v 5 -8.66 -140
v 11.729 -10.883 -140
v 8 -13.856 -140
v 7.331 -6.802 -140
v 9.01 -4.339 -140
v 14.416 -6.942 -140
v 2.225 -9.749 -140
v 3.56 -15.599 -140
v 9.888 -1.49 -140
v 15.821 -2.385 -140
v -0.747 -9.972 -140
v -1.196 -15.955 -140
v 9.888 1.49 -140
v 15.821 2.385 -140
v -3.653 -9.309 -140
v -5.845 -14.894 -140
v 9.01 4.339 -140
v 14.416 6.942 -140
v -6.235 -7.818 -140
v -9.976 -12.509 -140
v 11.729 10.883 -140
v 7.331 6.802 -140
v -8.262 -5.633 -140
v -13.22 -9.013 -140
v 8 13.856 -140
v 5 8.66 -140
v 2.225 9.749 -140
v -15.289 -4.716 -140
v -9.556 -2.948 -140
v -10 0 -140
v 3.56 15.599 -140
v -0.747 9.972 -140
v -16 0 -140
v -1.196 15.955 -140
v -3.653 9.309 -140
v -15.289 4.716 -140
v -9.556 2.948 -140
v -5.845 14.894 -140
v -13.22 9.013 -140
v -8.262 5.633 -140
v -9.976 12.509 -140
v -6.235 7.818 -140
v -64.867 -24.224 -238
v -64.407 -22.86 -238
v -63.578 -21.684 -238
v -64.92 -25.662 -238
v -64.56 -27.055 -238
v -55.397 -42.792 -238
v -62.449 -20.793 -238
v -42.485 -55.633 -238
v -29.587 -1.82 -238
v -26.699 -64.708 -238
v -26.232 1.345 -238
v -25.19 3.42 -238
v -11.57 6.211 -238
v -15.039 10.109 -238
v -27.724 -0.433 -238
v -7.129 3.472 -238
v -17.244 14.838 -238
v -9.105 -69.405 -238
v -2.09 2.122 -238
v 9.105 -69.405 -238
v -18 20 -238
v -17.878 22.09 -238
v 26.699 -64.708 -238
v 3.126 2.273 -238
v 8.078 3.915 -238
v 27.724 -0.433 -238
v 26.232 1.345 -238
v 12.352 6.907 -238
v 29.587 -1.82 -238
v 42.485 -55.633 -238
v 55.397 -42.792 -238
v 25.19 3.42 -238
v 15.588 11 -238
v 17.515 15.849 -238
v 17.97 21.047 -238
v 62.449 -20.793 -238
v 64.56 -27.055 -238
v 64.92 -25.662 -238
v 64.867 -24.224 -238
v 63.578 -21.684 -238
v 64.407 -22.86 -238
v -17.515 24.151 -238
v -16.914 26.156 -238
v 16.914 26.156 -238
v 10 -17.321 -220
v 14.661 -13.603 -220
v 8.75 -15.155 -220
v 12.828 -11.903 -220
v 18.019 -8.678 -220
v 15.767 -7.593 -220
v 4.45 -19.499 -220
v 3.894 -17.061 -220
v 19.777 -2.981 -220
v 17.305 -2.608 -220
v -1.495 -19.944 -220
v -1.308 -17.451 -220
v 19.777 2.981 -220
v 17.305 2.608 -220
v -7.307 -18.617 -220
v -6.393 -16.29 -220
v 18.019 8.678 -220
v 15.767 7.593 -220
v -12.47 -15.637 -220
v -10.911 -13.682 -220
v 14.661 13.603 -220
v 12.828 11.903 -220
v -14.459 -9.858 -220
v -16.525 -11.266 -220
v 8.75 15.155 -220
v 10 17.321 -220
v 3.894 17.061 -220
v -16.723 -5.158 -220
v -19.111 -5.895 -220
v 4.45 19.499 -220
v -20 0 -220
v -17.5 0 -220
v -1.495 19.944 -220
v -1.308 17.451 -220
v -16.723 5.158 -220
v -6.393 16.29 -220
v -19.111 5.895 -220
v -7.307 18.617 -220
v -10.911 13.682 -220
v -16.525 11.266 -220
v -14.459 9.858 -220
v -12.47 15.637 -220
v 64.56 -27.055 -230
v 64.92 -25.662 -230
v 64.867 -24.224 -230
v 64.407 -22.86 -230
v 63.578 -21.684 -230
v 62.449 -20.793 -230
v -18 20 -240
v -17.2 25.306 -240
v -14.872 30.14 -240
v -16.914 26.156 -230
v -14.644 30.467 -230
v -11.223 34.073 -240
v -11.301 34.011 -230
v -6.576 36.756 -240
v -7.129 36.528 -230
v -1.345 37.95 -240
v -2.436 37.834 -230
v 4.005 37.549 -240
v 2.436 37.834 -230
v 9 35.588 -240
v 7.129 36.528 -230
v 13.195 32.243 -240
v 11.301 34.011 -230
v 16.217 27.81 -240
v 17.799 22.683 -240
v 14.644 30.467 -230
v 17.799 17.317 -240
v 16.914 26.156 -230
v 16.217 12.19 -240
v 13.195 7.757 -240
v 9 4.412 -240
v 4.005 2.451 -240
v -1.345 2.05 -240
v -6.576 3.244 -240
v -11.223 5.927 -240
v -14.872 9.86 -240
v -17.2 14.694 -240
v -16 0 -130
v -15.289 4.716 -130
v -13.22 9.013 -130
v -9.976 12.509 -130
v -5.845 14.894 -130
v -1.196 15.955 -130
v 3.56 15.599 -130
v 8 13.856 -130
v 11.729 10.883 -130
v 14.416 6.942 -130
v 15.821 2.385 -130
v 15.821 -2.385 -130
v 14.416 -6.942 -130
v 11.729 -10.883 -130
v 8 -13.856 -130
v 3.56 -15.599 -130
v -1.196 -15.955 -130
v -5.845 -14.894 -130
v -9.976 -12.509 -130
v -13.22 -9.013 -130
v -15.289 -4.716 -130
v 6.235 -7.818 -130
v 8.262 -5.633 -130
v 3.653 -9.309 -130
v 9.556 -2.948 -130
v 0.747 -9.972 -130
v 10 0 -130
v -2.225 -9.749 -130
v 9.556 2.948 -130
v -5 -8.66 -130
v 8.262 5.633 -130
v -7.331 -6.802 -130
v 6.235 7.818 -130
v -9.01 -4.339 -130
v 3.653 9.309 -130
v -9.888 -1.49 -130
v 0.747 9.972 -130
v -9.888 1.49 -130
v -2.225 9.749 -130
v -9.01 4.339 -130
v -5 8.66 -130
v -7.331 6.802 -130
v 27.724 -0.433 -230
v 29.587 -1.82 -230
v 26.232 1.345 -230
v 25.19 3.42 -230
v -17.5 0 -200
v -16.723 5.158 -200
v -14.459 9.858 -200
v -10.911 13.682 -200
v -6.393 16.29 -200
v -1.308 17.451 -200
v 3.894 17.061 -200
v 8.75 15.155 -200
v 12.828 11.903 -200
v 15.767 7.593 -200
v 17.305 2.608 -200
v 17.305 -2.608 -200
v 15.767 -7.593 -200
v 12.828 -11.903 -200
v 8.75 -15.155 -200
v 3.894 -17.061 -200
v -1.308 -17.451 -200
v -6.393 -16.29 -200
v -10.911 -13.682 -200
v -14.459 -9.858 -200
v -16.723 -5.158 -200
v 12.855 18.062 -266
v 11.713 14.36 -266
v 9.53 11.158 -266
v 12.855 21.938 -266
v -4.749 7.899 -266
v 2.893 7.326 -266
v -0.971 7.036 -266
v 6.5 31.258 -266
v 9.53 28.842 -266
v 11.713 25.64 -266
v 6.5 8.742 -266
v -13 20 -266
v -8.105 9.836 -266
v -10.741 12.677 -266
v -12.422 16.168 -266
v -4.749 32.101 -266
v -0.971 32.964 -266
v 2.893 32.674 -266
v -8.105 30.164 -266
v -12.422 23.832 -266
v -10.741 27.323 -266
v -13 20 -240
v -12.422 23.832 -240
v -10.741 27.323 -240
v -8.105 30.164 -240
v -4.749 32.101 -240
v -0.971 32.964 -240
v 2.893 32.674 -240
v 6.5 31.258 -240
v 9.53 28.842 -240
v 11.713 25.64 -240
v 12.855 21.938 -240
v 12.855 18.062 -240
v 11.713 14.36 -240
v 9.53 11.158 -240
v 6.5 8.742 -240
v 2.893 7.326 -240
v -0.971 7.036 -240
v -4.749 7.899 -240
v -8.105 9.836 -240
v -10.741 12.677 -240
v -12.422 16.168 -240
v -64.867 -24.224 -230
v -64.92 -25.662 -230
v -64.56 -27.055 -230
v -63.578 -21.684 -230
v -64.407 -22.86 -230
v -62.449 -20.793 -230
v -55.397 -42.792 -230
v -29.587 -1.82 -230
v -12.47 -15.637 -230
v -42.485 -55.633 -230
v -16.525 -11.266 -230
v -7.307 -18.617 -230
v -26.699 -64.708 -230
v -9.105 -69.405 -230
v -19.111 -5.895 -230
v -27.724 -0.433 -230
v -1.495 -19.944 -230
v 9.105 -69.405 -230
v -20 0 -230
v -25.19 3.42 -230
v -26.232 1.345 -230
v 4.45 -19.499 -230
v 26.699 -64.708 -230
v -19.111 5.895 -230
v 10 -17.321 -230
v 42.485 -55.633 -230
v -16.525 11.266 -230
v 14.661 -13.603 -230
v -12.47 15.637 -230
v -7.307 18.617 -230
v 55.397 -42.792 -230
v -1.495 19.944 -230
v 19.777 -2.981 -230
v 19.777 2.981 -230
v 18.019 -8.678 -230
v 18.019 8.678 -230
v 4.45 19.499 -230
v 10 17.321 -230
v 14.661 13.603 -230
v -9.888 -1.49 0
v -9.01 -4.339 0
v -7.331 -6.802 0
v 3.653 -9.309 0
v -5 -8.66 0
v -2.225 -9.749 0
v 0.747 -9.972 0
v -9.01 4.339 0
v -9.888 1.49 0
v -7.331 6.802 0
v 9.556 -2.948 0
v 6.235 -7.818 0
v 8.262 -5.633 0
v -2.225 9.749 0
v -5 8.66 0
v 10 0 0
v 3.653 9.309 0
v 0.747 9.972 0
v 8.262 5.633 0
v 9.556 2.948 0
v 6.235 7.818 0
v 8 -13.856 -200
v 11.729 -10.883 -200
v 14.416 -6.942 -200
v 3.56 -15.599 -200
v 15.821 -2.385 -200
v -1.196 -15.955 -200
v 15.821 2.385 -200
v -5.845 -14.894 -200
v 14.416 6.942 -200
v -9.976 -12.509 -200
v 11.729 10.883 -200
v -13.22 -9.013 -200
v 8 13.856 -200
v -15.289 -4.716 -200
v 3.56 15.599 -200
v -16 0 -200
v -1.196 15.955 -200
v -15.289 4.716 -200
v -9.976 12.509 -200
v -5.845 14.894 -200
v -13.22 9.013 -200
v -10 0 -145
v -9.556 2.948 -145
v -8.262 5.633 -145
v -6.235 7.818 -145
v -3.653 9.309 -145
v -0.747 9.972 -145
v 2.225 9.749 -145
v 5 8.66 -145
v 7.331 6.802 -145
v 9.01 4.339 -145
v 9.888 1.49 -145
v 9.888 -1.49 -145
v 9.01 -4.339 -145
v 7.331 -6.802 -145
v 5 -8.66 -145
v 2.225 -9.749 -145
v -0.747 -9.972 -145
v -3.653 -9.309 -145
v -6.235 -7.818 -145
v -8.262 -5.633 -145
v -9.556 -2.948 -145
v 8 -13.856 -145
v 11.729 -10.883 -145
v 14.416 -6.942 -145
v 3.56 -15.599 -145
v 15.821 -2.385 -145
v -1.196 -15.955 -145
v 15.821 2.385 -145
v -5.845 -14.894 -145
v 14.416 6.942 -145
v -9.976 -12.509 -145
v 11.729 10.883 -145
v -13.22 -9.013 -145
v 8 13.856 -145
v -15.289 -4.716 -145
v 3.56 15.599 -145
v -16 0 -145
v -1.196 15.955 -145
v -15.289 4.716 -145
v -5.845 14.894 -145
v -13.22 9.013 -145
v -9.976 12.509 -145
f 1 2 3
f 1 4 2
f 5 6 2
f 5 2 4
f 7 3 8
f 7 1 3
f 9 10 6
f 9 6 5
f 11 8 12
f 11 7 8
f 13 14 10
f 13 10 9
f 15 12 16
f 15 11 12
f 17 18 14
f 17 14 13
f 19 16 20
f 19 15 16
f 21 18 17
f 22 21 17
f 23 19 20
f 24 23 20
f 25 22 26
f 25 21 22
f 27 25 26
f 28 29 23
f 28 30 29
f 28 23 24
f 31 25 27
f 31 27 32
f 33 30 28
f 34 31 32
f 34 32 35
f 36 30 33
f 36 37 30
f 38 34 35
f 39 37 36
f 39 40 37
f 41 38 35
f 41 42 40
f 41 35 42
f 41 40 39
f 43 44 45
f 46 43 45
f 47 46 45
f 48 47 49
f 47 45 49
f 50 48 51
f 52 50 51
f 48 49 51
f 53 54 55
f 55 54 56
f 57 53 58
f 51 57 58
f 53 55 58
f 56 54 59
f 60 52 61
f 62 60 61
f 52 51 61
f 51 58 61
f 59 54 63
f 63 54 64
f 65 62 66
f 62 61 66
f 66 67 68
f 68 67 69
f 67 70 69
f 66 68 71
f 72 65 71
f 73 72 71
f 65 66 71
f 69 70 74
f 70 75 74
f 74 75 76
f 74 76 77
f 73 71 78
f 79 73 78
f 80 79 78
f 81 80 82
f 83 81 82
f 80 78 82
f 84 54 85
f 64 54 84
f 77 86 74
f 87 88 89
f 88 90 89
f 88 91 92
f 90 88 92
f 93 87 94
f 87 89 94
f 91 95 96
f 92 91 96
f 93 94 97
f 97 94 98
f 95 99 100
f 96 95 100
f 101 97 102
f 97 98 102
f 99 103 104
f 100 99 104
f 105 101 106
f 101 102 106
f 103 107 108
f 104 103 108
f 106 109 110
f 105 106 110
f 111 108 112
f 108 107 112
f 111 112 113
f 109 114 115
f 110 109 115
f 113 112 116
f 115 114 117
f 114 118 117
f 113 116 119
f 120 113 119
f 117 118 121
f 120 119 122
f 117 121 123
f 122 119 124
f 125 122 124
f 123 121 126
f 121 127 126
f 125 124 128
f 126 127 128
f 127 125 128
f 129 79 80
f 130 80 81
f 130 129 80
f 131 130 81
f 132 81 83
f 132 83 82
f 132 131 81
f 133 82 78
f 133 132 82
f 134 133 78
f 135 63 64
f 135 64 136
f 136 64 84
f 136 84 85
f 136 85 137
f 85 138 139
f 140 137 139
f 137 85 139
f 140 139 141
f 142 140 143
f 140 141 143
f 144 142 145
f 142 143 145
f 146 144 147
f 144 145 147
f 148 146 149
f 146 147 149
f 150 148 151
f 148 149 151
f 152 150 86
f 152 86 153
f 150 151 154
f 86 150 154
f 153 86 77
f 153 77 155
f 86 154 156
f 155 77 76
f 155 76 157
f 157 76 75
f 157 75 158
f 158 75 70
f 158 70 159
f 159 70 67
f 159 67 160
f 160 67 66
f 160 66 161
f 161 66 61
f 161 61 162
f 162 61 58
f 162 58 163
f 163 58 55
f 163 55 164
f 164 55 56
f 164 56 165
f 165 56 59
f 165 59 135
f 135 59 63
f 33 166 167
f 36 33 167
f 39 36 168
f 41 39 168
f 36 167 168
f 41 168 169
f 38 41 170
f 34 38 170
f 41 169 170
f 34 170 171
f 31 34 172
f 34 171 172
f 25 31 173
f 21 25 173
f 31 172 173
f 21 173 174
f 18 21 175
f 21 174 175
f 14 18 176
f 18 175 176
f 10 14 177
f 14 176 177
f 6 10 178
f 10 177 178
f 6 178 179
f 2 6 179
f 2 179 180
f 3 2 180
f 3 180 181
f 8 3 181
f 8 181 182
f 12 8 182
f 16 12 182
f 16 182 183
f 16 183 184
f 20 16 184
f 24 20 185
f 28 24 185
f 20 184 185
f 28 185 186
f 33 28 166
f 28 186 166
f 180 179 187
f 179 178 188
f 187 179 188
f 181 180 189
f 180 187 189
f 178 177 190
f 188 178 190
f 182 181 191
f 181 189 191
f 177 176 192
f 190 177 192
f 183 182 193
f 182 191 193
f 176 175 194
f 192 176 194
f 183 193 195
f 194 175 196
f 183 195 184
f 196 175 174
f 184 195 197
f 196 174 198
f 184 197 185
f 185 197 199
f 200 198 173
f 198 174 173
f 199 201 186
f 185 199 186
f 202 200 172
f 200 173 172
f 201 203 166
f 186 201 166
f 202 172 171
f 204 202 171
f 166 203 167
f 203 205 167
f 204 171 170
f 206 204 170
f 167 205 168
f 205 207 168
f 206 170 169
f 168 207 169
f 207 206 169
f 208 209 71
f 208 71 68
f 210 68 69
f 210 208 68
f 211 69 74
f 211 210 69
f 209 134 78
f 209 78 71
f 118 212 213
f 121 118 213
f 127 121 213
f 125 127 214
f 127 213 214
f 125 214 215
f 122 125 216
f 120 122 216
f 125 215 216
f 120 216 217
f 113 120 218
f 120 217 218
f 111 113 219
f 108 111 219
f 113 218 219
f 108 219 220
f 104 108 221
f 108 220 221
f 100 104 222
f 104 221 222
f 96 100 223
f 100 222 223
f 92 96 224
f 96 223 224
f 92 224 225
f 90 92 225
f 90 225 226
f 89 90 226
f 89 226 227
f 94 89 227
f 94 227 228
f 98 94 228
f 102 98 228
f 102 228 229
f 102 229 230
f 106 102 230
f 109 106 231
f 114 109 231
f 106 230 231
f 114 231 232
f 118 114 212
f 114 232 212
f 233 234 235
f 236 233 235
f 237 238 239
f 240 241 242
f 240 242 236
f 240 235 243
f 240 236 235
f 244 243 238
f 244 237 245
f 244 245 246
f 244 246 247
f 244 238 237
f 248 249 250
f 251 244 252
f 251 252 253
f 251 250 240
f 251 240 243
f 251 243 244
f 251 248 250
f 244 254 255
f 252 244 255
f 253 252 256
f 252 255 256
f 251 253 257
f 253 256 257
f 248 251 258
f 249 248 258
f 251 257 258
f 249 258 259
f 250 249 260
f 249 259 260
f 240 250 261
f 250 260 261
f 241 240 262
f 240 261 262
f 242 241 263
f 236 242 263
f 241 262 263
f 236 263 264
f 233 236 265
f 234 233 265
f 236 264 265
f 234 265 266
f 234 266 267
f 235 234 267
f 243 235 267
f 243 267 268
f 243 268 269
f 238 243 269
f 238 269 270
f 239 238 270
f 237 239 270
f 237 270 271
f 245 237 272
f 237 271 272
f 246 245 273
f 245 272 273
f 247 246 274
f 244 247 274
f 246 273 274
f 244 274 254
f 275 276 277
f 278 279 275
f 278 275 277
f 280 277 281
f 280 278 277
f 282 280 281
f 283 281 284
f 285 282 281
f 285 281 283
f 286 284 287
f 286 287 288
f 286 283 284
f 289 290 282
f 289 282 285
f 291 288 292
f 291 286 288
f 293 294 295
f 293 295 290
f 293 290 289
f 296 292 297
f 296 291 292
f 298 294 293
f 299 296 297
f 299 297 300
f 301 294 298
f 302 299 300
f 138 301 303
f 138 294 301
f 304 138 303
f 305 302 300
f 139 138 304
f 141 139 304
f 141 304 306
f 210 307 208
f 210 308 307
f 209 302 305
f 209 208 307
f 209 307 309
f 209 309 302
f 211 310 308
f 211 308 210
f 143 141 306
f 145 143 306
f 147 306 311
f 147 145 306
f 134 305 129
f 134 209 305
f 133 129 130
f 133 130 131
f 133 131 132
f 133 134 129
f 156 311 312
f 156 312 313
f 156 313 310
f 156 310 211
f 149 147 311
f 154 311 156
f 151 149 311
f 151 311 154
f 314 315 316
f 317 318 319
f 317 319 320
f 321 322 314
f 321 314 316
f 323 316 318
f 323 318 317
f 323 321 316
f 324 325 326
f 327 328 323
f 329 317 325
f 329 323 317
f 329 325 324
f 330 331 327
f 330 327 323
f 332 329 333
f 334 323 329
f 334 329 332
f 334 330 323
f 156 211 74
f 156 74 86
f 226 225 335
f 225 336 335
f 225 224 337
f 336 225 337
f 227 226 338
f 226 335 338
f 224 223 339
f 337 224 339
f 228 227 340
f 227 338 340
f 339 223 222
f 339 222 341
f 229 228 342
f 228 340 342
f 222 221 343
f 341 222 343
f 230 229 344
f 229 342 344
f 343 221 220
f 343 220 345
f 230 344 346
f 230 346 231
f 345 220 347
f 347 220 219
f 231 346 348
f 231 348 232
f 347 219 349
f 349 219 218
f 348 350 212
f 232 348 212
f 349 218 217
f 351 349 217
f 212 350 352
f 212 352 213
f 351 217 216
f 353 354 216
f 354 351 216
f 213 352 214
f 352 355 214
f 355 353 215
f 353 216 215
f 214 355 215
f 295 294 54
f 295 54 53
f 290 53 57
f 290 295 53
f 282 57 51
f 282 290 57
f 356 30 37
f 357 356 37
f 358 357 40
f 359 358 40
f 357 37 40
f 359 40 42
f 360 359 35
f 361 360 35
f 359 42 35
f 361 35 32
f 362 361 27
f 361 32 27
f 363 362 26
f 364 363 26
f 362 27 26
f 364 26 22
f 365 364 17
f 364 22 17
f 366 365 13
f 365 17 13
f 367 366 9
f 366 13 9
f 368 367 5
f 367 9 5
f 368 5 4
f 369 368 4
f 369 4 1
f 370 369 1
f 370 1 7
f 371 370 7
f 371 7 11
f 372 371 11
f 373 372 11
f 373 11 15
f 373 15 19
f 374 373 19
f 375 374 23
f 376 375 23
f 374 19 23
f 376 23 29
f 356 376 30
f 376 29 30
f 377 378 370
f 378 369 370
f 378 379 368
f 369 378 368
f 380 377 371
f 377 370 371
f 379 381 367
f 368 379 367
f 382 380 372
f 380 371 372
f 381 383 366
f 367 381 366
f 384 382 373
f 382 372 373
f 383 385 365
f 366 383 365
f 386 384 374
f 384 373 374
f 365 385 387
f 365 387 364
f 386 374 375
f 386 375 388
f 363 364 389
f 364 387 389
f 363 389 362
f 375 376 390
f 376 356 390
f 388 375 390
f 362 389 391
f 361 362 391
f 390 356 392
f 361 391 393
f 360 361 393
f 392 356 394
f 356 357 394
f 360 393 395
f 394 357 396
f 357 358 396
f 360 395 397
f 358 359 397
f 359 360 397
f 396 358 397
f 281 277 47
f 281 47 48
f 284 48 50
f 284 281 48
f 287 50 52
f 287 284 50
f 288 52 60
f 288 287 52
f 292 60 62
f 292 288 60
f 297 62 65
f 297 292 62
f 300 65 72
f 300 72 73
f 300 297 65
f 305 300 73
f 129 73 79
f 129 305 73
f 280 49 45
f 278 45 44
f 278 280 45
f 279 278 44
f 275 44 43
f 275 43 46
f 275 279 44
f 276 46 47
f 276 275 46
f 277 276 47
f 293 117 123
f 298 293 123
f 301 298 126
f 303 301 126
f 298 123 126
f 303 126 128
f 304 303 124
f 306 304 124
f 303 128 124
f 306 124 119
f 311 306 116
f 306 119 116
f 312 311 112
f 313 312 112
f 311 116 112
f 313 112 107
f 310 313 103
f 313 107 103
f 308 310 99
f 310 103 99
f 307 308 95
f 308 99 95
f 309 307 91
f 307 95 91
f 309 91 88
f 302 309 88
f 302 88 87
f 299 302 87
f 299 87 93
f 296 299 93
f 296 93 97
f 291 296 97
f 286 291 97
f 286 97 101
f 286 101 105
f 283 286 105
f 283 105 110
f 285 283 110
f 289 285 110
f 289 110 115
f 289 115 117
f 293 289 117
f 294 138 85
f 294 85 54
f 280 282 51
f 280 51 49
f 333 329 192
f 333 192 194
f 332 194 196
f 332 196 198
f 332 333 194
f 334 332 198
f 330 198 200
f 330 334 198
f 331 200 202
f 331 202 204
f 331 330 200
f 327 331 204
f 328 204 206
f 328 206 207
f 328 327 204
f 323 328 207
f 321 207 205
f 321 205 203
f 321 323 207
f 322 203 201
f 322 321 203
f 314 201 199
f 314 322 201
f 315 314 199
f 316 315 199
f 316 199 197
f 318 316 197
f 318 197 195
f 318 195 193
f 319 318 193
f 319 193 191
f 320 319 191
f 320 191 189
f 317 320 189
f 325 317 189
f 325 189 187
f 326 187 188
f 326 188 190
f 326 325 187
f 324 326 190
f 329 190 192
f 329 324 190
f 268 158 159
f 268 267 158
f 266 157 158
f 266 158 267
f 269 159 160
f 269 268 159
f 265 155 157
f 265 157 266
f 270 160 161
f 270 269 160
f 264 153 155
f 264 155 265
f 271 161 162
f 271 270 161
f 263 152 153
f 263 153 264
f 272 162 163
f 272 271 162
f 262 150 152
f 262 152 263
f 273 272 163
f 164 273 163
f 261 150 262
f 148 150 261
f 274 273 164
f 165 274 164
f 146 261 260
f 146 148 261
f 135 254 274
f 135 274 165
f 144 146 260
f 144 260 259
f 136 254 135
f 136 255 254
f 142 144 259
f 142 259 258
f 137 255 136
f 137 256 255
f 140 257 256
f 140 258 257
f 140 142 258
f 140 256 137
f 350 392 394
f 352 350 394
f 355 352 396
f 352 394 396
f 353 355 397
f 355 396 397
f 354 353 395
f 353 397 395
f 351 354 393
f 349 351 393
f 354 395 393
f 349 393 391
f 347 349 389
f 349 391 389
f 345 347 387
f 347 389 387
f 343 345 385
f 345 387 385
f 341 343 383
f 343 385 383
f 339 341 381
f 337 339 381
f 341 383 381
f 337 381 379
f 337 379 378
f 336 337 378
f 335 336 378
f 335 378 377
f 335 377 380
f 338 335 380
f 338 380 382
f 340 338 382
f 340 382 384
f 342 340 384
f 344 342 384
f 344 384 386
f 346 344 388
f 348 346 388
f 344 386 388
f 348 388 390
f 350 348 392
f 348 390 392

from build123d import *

# Parameters (mm, degrees)
SKETCH1_R            = 10
BOSS_EXTRUDE1_DEPTH  = 130
SKETCH2_R            = 16
BOSS_EXTRUDE2_DEPTH  = 10
SKETCH3_R            = 10
BOSS_EXTRUDE4_DEPTH  = 5
SKETCH6_R            = 16
BOSS_EXTRUDE5_DEPTH  = 55
SKETCH7_R            = 17.5
BOSS_EXTRUDE6_DEPTH  = 20
SKETCH8_R            = 20
BOSS_EXTRUDE7_DEPTH  = 10
SKETCH9_R            = 18
BOSS_EXTRUDE8_DEPTH  = 10
SKETCH10_R           = 13
BOSS_EXTRUDE9_DEPTH  = 26
BOSS_EXTRUDE10_DEPTH = 8


with BuildPart() as part:
    # Sketch1 → Boss-Extrude1 (new body)
    with BuildSketch(Plane.XY):
        Circle(SKETCH1_R)
    extrude(amount=-BOSS_EXTRUDE1_DEPTH)

    # Sketch2 → Boss-Extrude2 (add)
    with BuildSketch(Plane(origin=(0, 0, -130), x_dir=(-1, 0, 0), z_dir=(0, 0, -1))):
        Circle(SKETCH2_R)
    extrude(amount=BOSS_EXTRUDE2_DEPTH)

    # Sketch3 → Boss-Extrude4 (add)
    with BuildSketch(Plane(origin=(0, 0, -140), x_dir=(-1, 0, 0), z_dir=(0, 0, -1))):
        Circle(SKETCH3_R)
    extrude(amount=BOSS_EXTRUDE4_DEPTH)

    # Sketch6 → Boss-Extrude5 (add)
    with BuildSketch(Plane(origin=(0, 0, -145), x_dir=(-1, 0, 0), z_dir=(0, 0, -1))):
        Circle(SKETCH6_R)
    extrude(amount=BOSS_EXTRUDE5_DEPTH)

    # Sketch7 → Boss-Extrude6 (add)
    with BuildSketch(Plane(origin=(0, 0, -200), x_dir=(-1, 0, 0), z_dir=(0, 0, -1))):
        Circle(SKETCH7_R)
    extrude(amount=BOSS_EXTRUDE6_DEPTH)

    # Sketch8 → Boss-Extrude7 (add)
    with BuildSketch(Plane(origin=(0, 0, -220), x_dir=(-1, 0, 0), z_dir=(0, 0, -1))):
        Circle(SKETCH8_R)
    extrude(amount=BOSS_EXTRUDE7_DEPTH)

    # Sketch9 → Boss-Extrude8 (add)
    with BuildSketch(Plane(origin=(0, 0, -230), x_dir=(-1, 0, 0), z_dir=(0, 0, -1))):
        with Locations((0, 20)):
            Circle(SKETCH9_R)
    extrude(amount=BOSS_EXTRUDE8_DEPTH)

    # Sketch10 → Boss-Extrude9 (add)
    with BuildSketch(Plane(origin=(0, 0, -240), x_dir=(-1, 0, 0), z_dir=(0, 0, -1))):
        with Locations((0, 20)):
            Circle(SKETCH10_R)
    extrude(amount=BOSS_EXTRUDE9_DEPTH)

    # Sketch11 → Boss-Extrude10 (add)
    with BuildSketch(Plane.XY.offset(-230)):
        with BuildLine():
            Line((-16.914467174, 26.15636258), (-25.189753073, 3.420201433))
            ThreePointArc((-25.189753073, 3.420201433), (-26.92623485, 0.41252677), (-29.586679281, -1.819851171))
            Line((-29.586679281, -1.819851171), (-62.4486633, -20.792726491))
            ThreePointArc((-62.4486633, -20.792726491), (-64.686631077, -23.525461465), (-64.560098939, -27.055380703))
            ThreePointArc((-64.560098939, -27.055380703), (0, -70), (64.560098939, -27.055380703))
            ThreePointArc((64.560098939, -27.055380703), (64.686631077, -23.525461465), (62.4486633, -20.792726491))
            Line((62.4486633, -20.792726491), (29.586679281, -1.819851171))
            ThreePointArc((29.586679281, -1.819851171), (26.92623485, 0.41252677), (25.189753073, 3.420201433))
            Line((25.189753073, 3.420201433), (16.914467174, 26.15636258))
            ThreePointArc((16.914467174, 26.15636258), (0, 2), (-16.914467174, 26.15636258))
        make_face()
    extrude(amount=-BOSS_EXTRUDE10_DEPTH)


solid = part.part
